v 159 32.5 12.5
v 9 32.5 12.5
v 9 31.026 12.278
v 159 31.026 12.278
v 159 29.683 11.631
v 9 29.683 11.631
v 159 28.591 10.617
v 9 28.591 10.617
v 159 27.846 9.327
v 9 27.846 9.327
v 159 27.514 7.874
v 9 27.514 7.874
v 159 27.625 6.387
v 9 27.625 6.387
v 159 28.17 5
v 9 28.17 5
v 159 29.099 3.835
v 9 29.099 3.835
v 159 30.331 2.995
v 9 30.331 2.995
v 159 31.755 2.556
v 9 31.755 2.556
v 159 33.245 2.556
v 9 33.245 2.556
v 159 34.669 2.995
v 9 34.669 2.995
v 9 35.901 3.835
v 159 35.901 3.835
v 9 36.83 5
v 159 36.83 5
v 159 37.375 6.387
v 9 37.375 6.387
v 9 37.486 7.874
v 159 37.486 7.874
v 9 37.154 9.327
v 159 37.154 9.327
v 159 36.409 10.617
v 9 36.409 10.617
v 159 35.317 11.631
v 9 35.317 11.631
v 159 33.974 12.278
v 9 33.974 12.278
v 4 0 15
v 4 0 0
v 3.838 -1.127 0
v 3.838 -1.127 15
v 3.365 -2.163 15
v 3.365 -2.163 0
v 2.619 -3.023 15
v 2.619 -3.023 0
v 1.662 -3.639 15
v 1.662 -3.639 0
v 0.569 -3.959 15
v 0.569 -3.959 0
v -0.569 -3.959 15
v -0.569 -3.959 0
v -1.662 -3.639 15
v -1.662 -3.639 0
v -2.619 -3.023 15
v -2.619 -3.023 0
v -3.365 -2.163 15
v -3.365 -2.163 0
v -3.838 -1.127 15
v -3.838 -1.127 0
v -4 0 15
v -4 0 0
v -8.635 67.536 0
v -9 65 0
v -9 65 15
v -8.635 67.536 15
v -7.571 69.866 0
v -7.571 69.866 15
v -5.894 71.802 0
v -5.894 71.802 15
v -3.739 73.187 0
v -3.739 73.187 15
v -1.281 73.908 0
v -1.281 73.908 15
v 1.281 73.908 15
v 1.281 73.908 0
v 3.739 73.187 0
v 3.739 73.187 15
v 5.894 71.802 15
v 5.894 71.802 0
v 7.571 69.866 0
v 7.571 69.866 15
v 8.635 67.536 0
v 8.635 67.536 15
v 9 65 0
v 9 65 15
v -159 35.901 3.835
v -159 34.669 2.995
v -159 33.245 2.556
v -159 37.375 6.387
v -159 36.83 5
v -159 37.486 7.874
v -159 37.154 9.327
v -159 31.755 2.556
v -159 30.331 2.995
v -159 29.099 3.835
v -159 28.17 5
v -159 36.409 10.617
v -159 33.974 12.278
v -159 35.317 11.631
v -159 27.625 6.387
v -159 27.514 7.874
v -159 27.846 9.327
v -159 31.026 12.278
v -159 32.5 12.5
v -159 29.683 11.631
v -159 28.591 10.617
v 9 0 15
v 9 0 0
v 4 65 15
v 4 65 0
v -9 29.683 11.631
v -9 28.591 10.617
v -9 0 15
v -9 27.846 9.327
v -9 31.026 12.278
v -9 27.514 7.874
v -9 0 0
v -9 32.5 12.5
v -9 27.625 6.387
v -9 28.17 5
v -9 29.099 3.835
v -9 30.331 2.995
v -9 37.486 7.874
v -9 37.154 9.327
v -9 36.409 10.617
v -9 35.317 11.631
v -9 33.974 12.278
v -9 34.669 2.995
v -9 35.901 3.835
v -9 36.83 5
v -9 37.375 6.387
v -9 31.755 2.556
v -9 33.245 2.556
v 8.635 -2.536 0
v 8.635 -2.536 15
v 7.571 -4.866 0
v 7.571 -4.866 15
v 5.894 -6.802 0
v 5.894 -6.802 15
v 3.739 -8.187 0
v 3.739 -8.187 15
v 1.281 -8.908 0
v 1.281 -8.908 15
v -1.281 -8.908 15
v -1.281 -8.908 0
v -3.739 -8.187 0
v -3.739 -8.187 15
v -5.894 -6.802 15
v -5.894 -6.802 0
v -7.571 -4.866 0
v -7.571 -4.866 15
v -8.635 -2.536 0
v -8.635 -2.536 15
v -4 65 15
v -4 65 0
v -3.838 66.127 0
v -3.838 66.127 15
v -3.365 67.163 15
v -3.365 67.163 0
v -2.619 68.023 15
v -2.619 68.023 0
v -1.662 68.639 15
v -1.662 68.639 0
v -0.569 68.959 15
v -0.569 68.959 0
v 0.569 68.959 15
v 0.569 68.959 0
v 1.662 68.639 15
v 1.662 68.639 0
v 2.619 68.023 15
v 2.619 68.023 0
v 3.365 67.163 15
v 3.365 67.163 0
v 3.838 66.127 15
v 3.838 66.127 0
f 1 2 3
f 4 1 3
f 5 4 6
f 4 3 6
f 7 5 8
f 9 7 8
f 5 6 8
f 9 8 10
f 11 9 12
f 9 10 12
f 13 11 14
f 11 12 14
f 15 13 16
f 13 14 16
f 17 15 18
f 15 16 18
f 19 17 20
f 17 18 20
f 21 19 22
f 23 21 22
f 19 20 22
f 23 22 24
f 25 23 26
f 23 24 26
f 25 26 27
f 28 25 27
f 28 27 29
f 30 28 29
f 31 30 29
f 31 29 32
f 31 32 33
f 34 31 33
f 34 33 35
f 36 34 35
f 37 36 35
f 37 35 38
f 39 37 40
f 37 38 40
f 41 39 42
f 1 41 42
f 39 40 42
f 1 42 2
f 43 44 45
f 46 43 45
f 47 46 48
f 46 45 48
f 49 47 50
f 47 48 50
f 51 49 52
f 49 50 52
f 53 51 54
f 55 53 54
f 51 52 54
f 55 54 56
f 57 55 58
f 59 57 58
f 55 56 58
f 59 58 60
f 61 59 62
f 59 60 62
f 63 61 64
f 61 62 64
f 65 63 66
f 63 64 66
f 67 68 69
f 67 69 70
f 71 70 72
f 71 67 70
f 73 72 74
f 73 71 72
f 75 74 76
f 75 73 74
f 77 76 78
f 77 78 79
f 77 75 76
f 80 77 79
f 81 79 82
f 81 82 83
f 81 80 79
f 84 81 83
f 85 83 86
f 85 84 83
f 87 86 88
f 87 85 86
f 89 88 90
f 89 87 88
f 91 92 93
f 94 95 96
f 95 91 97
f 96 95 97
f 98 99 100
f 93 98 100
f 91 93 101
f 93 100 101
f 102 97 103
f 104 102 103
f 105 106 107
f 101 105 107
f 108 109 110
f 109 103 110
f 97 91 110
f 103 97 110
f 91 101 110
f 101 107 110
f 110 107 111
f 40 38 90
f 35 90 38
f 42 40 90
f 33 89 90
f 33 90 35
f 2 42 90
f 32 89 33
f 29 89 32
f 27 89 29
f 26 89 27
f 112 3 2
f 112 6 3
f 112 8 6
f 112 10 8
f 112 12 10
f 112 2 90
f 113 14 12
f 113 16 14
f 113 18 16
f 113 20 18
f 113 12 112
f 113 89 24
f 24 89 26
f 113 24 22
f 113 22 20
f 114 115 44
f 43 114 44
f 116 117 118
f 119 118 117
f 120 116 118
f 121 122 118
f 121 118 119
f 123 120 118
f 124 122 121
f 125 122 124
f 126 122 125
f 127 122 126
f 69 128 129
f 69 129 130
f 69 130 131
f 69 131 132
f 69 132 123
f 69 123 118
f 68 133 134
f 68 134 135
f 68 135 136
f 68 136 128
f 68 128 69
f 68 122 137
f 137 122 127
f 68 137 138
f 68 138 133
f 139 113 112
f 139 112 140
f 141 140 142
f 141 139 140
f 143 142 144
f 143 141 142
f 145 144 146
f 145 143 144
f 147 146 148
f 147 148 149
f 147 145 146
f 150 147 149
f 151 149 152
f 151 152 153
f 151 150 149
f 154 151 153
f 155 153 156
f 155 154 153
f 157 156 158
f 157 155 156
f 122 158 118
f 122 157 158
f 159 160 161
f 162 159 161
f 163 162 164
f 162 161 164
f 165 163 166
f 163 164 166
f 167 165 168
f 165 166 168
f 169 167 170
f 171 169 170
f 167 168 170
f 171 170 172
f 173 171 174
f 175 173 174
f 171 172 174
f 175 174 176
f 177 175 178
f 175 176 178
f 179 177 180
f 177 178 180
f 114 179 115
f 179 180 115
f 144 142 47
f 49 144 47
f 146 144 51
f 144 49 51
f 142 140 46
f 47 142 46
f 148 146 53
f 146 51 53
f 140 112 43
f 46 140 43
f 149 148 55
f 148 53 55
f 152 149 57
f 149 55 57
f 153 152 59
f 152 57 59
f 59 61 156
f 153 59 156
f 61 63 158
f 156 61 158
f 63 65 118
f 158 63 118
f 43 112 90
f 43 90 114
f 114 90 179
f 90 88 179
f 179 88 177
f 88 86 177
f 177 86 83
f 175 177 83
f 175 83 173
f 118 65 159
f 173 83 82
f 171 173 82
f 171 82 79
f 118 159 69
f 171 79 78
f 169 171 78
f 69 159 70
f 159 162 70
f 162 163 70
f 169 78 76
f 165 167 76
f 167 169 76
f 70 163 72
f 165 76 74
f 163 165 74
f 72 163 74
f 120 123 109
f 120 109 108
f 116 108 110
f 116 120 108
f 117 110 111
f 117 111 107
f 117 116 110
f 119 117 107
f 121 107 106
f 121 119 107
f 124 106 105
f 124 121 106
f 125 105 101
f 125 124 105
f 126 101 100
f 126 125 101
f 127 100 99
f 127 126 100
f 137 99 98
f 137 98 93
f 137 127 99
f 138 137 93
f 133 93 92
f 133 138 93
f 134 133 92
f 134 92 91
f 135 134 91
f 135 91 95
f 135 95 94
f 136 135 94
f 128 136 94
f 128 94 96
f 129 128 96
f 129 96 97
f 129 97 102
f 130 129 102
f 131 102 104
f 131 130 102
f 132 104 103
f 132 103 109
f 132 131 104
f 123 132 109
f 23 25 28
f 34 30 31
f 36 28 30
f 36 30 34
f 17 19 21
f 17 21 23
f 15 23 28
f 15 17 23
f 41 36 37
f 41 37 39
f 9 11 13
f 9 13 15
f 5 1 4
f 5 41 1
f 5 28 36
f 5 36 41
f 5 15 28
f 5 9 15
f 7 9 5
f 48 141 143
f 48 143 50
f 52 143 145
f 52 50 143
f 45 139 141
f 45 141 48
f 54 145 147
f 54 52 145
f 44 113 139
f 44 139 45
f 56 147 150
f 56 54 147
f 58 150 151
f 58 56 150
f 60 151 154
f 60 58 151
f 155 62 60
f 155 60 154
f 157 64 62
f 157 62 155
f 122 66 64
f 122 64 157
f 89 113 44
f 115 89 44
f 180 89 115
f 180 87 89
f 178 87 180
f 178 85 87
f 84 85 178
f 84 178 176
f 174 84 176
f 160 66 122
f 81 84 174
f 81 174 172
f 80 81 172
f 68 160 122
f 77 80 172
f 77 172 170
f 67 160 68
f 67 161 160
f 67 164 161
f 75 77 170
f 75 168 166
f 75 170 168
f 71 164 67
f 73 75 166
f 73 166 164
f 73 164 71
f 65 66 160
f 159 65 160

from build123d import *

# Parameters (mm, degrees)
BOSS_EXTRUDE1_DEPTH = 15
SKETCH2_R           = 5
BOSS_EXTRUDE2_DEPTH = 150


with BuildPart() as part:
    # Sketch1 → Boss-Extrude1 (new body)
    with BuildSketch(Plane.XY):
        with BuildLine():
            Line((-9, 0), (-9, 65))
            ThreePointArc((-9, 65), (0, 74), (9, 65))
            Line((9, 65), (9, 0))
            ThreePointArc((9, 0), (0, -9), (-9, 0))
        make_face()
        with BuildLine():
            Line((-4, 0), (-4, 65))
            ThreePointArc((-4, 65), (0, 69), (4, 65))
            Line((4, 65), (4, 0))
            ThreePointArc((4, 0), (0, -4), (-4, 0))
        make_face(mode=Mode.SUBTRACT)
    extrude(amount=BOSS_EXTRUDE1_DEPTH)

    # Sketch2 → Boss-Extrude2 (add)
    with BuildSketch(Plane(origin=(9, 0, 0), x_dir=(0, 0, -1), z_dir=(1, 0, 0))):
        with Locations(Location((-7.5, 32.5, 0), (0, 0, 180))):
            Circle(SKETCH2_R)
    boss_extrude2 = extrude(amount=BOSS_EXTRUDE2_DEPTH)

    # Mirror1: Boss-Extrude2 across plane
    add(boss_extrude2.mirror(Plane(origin=(0, 0, 0), x_dir=(0, 0, 1), z_dir=(1, 0, 0))))


solid = part.part
